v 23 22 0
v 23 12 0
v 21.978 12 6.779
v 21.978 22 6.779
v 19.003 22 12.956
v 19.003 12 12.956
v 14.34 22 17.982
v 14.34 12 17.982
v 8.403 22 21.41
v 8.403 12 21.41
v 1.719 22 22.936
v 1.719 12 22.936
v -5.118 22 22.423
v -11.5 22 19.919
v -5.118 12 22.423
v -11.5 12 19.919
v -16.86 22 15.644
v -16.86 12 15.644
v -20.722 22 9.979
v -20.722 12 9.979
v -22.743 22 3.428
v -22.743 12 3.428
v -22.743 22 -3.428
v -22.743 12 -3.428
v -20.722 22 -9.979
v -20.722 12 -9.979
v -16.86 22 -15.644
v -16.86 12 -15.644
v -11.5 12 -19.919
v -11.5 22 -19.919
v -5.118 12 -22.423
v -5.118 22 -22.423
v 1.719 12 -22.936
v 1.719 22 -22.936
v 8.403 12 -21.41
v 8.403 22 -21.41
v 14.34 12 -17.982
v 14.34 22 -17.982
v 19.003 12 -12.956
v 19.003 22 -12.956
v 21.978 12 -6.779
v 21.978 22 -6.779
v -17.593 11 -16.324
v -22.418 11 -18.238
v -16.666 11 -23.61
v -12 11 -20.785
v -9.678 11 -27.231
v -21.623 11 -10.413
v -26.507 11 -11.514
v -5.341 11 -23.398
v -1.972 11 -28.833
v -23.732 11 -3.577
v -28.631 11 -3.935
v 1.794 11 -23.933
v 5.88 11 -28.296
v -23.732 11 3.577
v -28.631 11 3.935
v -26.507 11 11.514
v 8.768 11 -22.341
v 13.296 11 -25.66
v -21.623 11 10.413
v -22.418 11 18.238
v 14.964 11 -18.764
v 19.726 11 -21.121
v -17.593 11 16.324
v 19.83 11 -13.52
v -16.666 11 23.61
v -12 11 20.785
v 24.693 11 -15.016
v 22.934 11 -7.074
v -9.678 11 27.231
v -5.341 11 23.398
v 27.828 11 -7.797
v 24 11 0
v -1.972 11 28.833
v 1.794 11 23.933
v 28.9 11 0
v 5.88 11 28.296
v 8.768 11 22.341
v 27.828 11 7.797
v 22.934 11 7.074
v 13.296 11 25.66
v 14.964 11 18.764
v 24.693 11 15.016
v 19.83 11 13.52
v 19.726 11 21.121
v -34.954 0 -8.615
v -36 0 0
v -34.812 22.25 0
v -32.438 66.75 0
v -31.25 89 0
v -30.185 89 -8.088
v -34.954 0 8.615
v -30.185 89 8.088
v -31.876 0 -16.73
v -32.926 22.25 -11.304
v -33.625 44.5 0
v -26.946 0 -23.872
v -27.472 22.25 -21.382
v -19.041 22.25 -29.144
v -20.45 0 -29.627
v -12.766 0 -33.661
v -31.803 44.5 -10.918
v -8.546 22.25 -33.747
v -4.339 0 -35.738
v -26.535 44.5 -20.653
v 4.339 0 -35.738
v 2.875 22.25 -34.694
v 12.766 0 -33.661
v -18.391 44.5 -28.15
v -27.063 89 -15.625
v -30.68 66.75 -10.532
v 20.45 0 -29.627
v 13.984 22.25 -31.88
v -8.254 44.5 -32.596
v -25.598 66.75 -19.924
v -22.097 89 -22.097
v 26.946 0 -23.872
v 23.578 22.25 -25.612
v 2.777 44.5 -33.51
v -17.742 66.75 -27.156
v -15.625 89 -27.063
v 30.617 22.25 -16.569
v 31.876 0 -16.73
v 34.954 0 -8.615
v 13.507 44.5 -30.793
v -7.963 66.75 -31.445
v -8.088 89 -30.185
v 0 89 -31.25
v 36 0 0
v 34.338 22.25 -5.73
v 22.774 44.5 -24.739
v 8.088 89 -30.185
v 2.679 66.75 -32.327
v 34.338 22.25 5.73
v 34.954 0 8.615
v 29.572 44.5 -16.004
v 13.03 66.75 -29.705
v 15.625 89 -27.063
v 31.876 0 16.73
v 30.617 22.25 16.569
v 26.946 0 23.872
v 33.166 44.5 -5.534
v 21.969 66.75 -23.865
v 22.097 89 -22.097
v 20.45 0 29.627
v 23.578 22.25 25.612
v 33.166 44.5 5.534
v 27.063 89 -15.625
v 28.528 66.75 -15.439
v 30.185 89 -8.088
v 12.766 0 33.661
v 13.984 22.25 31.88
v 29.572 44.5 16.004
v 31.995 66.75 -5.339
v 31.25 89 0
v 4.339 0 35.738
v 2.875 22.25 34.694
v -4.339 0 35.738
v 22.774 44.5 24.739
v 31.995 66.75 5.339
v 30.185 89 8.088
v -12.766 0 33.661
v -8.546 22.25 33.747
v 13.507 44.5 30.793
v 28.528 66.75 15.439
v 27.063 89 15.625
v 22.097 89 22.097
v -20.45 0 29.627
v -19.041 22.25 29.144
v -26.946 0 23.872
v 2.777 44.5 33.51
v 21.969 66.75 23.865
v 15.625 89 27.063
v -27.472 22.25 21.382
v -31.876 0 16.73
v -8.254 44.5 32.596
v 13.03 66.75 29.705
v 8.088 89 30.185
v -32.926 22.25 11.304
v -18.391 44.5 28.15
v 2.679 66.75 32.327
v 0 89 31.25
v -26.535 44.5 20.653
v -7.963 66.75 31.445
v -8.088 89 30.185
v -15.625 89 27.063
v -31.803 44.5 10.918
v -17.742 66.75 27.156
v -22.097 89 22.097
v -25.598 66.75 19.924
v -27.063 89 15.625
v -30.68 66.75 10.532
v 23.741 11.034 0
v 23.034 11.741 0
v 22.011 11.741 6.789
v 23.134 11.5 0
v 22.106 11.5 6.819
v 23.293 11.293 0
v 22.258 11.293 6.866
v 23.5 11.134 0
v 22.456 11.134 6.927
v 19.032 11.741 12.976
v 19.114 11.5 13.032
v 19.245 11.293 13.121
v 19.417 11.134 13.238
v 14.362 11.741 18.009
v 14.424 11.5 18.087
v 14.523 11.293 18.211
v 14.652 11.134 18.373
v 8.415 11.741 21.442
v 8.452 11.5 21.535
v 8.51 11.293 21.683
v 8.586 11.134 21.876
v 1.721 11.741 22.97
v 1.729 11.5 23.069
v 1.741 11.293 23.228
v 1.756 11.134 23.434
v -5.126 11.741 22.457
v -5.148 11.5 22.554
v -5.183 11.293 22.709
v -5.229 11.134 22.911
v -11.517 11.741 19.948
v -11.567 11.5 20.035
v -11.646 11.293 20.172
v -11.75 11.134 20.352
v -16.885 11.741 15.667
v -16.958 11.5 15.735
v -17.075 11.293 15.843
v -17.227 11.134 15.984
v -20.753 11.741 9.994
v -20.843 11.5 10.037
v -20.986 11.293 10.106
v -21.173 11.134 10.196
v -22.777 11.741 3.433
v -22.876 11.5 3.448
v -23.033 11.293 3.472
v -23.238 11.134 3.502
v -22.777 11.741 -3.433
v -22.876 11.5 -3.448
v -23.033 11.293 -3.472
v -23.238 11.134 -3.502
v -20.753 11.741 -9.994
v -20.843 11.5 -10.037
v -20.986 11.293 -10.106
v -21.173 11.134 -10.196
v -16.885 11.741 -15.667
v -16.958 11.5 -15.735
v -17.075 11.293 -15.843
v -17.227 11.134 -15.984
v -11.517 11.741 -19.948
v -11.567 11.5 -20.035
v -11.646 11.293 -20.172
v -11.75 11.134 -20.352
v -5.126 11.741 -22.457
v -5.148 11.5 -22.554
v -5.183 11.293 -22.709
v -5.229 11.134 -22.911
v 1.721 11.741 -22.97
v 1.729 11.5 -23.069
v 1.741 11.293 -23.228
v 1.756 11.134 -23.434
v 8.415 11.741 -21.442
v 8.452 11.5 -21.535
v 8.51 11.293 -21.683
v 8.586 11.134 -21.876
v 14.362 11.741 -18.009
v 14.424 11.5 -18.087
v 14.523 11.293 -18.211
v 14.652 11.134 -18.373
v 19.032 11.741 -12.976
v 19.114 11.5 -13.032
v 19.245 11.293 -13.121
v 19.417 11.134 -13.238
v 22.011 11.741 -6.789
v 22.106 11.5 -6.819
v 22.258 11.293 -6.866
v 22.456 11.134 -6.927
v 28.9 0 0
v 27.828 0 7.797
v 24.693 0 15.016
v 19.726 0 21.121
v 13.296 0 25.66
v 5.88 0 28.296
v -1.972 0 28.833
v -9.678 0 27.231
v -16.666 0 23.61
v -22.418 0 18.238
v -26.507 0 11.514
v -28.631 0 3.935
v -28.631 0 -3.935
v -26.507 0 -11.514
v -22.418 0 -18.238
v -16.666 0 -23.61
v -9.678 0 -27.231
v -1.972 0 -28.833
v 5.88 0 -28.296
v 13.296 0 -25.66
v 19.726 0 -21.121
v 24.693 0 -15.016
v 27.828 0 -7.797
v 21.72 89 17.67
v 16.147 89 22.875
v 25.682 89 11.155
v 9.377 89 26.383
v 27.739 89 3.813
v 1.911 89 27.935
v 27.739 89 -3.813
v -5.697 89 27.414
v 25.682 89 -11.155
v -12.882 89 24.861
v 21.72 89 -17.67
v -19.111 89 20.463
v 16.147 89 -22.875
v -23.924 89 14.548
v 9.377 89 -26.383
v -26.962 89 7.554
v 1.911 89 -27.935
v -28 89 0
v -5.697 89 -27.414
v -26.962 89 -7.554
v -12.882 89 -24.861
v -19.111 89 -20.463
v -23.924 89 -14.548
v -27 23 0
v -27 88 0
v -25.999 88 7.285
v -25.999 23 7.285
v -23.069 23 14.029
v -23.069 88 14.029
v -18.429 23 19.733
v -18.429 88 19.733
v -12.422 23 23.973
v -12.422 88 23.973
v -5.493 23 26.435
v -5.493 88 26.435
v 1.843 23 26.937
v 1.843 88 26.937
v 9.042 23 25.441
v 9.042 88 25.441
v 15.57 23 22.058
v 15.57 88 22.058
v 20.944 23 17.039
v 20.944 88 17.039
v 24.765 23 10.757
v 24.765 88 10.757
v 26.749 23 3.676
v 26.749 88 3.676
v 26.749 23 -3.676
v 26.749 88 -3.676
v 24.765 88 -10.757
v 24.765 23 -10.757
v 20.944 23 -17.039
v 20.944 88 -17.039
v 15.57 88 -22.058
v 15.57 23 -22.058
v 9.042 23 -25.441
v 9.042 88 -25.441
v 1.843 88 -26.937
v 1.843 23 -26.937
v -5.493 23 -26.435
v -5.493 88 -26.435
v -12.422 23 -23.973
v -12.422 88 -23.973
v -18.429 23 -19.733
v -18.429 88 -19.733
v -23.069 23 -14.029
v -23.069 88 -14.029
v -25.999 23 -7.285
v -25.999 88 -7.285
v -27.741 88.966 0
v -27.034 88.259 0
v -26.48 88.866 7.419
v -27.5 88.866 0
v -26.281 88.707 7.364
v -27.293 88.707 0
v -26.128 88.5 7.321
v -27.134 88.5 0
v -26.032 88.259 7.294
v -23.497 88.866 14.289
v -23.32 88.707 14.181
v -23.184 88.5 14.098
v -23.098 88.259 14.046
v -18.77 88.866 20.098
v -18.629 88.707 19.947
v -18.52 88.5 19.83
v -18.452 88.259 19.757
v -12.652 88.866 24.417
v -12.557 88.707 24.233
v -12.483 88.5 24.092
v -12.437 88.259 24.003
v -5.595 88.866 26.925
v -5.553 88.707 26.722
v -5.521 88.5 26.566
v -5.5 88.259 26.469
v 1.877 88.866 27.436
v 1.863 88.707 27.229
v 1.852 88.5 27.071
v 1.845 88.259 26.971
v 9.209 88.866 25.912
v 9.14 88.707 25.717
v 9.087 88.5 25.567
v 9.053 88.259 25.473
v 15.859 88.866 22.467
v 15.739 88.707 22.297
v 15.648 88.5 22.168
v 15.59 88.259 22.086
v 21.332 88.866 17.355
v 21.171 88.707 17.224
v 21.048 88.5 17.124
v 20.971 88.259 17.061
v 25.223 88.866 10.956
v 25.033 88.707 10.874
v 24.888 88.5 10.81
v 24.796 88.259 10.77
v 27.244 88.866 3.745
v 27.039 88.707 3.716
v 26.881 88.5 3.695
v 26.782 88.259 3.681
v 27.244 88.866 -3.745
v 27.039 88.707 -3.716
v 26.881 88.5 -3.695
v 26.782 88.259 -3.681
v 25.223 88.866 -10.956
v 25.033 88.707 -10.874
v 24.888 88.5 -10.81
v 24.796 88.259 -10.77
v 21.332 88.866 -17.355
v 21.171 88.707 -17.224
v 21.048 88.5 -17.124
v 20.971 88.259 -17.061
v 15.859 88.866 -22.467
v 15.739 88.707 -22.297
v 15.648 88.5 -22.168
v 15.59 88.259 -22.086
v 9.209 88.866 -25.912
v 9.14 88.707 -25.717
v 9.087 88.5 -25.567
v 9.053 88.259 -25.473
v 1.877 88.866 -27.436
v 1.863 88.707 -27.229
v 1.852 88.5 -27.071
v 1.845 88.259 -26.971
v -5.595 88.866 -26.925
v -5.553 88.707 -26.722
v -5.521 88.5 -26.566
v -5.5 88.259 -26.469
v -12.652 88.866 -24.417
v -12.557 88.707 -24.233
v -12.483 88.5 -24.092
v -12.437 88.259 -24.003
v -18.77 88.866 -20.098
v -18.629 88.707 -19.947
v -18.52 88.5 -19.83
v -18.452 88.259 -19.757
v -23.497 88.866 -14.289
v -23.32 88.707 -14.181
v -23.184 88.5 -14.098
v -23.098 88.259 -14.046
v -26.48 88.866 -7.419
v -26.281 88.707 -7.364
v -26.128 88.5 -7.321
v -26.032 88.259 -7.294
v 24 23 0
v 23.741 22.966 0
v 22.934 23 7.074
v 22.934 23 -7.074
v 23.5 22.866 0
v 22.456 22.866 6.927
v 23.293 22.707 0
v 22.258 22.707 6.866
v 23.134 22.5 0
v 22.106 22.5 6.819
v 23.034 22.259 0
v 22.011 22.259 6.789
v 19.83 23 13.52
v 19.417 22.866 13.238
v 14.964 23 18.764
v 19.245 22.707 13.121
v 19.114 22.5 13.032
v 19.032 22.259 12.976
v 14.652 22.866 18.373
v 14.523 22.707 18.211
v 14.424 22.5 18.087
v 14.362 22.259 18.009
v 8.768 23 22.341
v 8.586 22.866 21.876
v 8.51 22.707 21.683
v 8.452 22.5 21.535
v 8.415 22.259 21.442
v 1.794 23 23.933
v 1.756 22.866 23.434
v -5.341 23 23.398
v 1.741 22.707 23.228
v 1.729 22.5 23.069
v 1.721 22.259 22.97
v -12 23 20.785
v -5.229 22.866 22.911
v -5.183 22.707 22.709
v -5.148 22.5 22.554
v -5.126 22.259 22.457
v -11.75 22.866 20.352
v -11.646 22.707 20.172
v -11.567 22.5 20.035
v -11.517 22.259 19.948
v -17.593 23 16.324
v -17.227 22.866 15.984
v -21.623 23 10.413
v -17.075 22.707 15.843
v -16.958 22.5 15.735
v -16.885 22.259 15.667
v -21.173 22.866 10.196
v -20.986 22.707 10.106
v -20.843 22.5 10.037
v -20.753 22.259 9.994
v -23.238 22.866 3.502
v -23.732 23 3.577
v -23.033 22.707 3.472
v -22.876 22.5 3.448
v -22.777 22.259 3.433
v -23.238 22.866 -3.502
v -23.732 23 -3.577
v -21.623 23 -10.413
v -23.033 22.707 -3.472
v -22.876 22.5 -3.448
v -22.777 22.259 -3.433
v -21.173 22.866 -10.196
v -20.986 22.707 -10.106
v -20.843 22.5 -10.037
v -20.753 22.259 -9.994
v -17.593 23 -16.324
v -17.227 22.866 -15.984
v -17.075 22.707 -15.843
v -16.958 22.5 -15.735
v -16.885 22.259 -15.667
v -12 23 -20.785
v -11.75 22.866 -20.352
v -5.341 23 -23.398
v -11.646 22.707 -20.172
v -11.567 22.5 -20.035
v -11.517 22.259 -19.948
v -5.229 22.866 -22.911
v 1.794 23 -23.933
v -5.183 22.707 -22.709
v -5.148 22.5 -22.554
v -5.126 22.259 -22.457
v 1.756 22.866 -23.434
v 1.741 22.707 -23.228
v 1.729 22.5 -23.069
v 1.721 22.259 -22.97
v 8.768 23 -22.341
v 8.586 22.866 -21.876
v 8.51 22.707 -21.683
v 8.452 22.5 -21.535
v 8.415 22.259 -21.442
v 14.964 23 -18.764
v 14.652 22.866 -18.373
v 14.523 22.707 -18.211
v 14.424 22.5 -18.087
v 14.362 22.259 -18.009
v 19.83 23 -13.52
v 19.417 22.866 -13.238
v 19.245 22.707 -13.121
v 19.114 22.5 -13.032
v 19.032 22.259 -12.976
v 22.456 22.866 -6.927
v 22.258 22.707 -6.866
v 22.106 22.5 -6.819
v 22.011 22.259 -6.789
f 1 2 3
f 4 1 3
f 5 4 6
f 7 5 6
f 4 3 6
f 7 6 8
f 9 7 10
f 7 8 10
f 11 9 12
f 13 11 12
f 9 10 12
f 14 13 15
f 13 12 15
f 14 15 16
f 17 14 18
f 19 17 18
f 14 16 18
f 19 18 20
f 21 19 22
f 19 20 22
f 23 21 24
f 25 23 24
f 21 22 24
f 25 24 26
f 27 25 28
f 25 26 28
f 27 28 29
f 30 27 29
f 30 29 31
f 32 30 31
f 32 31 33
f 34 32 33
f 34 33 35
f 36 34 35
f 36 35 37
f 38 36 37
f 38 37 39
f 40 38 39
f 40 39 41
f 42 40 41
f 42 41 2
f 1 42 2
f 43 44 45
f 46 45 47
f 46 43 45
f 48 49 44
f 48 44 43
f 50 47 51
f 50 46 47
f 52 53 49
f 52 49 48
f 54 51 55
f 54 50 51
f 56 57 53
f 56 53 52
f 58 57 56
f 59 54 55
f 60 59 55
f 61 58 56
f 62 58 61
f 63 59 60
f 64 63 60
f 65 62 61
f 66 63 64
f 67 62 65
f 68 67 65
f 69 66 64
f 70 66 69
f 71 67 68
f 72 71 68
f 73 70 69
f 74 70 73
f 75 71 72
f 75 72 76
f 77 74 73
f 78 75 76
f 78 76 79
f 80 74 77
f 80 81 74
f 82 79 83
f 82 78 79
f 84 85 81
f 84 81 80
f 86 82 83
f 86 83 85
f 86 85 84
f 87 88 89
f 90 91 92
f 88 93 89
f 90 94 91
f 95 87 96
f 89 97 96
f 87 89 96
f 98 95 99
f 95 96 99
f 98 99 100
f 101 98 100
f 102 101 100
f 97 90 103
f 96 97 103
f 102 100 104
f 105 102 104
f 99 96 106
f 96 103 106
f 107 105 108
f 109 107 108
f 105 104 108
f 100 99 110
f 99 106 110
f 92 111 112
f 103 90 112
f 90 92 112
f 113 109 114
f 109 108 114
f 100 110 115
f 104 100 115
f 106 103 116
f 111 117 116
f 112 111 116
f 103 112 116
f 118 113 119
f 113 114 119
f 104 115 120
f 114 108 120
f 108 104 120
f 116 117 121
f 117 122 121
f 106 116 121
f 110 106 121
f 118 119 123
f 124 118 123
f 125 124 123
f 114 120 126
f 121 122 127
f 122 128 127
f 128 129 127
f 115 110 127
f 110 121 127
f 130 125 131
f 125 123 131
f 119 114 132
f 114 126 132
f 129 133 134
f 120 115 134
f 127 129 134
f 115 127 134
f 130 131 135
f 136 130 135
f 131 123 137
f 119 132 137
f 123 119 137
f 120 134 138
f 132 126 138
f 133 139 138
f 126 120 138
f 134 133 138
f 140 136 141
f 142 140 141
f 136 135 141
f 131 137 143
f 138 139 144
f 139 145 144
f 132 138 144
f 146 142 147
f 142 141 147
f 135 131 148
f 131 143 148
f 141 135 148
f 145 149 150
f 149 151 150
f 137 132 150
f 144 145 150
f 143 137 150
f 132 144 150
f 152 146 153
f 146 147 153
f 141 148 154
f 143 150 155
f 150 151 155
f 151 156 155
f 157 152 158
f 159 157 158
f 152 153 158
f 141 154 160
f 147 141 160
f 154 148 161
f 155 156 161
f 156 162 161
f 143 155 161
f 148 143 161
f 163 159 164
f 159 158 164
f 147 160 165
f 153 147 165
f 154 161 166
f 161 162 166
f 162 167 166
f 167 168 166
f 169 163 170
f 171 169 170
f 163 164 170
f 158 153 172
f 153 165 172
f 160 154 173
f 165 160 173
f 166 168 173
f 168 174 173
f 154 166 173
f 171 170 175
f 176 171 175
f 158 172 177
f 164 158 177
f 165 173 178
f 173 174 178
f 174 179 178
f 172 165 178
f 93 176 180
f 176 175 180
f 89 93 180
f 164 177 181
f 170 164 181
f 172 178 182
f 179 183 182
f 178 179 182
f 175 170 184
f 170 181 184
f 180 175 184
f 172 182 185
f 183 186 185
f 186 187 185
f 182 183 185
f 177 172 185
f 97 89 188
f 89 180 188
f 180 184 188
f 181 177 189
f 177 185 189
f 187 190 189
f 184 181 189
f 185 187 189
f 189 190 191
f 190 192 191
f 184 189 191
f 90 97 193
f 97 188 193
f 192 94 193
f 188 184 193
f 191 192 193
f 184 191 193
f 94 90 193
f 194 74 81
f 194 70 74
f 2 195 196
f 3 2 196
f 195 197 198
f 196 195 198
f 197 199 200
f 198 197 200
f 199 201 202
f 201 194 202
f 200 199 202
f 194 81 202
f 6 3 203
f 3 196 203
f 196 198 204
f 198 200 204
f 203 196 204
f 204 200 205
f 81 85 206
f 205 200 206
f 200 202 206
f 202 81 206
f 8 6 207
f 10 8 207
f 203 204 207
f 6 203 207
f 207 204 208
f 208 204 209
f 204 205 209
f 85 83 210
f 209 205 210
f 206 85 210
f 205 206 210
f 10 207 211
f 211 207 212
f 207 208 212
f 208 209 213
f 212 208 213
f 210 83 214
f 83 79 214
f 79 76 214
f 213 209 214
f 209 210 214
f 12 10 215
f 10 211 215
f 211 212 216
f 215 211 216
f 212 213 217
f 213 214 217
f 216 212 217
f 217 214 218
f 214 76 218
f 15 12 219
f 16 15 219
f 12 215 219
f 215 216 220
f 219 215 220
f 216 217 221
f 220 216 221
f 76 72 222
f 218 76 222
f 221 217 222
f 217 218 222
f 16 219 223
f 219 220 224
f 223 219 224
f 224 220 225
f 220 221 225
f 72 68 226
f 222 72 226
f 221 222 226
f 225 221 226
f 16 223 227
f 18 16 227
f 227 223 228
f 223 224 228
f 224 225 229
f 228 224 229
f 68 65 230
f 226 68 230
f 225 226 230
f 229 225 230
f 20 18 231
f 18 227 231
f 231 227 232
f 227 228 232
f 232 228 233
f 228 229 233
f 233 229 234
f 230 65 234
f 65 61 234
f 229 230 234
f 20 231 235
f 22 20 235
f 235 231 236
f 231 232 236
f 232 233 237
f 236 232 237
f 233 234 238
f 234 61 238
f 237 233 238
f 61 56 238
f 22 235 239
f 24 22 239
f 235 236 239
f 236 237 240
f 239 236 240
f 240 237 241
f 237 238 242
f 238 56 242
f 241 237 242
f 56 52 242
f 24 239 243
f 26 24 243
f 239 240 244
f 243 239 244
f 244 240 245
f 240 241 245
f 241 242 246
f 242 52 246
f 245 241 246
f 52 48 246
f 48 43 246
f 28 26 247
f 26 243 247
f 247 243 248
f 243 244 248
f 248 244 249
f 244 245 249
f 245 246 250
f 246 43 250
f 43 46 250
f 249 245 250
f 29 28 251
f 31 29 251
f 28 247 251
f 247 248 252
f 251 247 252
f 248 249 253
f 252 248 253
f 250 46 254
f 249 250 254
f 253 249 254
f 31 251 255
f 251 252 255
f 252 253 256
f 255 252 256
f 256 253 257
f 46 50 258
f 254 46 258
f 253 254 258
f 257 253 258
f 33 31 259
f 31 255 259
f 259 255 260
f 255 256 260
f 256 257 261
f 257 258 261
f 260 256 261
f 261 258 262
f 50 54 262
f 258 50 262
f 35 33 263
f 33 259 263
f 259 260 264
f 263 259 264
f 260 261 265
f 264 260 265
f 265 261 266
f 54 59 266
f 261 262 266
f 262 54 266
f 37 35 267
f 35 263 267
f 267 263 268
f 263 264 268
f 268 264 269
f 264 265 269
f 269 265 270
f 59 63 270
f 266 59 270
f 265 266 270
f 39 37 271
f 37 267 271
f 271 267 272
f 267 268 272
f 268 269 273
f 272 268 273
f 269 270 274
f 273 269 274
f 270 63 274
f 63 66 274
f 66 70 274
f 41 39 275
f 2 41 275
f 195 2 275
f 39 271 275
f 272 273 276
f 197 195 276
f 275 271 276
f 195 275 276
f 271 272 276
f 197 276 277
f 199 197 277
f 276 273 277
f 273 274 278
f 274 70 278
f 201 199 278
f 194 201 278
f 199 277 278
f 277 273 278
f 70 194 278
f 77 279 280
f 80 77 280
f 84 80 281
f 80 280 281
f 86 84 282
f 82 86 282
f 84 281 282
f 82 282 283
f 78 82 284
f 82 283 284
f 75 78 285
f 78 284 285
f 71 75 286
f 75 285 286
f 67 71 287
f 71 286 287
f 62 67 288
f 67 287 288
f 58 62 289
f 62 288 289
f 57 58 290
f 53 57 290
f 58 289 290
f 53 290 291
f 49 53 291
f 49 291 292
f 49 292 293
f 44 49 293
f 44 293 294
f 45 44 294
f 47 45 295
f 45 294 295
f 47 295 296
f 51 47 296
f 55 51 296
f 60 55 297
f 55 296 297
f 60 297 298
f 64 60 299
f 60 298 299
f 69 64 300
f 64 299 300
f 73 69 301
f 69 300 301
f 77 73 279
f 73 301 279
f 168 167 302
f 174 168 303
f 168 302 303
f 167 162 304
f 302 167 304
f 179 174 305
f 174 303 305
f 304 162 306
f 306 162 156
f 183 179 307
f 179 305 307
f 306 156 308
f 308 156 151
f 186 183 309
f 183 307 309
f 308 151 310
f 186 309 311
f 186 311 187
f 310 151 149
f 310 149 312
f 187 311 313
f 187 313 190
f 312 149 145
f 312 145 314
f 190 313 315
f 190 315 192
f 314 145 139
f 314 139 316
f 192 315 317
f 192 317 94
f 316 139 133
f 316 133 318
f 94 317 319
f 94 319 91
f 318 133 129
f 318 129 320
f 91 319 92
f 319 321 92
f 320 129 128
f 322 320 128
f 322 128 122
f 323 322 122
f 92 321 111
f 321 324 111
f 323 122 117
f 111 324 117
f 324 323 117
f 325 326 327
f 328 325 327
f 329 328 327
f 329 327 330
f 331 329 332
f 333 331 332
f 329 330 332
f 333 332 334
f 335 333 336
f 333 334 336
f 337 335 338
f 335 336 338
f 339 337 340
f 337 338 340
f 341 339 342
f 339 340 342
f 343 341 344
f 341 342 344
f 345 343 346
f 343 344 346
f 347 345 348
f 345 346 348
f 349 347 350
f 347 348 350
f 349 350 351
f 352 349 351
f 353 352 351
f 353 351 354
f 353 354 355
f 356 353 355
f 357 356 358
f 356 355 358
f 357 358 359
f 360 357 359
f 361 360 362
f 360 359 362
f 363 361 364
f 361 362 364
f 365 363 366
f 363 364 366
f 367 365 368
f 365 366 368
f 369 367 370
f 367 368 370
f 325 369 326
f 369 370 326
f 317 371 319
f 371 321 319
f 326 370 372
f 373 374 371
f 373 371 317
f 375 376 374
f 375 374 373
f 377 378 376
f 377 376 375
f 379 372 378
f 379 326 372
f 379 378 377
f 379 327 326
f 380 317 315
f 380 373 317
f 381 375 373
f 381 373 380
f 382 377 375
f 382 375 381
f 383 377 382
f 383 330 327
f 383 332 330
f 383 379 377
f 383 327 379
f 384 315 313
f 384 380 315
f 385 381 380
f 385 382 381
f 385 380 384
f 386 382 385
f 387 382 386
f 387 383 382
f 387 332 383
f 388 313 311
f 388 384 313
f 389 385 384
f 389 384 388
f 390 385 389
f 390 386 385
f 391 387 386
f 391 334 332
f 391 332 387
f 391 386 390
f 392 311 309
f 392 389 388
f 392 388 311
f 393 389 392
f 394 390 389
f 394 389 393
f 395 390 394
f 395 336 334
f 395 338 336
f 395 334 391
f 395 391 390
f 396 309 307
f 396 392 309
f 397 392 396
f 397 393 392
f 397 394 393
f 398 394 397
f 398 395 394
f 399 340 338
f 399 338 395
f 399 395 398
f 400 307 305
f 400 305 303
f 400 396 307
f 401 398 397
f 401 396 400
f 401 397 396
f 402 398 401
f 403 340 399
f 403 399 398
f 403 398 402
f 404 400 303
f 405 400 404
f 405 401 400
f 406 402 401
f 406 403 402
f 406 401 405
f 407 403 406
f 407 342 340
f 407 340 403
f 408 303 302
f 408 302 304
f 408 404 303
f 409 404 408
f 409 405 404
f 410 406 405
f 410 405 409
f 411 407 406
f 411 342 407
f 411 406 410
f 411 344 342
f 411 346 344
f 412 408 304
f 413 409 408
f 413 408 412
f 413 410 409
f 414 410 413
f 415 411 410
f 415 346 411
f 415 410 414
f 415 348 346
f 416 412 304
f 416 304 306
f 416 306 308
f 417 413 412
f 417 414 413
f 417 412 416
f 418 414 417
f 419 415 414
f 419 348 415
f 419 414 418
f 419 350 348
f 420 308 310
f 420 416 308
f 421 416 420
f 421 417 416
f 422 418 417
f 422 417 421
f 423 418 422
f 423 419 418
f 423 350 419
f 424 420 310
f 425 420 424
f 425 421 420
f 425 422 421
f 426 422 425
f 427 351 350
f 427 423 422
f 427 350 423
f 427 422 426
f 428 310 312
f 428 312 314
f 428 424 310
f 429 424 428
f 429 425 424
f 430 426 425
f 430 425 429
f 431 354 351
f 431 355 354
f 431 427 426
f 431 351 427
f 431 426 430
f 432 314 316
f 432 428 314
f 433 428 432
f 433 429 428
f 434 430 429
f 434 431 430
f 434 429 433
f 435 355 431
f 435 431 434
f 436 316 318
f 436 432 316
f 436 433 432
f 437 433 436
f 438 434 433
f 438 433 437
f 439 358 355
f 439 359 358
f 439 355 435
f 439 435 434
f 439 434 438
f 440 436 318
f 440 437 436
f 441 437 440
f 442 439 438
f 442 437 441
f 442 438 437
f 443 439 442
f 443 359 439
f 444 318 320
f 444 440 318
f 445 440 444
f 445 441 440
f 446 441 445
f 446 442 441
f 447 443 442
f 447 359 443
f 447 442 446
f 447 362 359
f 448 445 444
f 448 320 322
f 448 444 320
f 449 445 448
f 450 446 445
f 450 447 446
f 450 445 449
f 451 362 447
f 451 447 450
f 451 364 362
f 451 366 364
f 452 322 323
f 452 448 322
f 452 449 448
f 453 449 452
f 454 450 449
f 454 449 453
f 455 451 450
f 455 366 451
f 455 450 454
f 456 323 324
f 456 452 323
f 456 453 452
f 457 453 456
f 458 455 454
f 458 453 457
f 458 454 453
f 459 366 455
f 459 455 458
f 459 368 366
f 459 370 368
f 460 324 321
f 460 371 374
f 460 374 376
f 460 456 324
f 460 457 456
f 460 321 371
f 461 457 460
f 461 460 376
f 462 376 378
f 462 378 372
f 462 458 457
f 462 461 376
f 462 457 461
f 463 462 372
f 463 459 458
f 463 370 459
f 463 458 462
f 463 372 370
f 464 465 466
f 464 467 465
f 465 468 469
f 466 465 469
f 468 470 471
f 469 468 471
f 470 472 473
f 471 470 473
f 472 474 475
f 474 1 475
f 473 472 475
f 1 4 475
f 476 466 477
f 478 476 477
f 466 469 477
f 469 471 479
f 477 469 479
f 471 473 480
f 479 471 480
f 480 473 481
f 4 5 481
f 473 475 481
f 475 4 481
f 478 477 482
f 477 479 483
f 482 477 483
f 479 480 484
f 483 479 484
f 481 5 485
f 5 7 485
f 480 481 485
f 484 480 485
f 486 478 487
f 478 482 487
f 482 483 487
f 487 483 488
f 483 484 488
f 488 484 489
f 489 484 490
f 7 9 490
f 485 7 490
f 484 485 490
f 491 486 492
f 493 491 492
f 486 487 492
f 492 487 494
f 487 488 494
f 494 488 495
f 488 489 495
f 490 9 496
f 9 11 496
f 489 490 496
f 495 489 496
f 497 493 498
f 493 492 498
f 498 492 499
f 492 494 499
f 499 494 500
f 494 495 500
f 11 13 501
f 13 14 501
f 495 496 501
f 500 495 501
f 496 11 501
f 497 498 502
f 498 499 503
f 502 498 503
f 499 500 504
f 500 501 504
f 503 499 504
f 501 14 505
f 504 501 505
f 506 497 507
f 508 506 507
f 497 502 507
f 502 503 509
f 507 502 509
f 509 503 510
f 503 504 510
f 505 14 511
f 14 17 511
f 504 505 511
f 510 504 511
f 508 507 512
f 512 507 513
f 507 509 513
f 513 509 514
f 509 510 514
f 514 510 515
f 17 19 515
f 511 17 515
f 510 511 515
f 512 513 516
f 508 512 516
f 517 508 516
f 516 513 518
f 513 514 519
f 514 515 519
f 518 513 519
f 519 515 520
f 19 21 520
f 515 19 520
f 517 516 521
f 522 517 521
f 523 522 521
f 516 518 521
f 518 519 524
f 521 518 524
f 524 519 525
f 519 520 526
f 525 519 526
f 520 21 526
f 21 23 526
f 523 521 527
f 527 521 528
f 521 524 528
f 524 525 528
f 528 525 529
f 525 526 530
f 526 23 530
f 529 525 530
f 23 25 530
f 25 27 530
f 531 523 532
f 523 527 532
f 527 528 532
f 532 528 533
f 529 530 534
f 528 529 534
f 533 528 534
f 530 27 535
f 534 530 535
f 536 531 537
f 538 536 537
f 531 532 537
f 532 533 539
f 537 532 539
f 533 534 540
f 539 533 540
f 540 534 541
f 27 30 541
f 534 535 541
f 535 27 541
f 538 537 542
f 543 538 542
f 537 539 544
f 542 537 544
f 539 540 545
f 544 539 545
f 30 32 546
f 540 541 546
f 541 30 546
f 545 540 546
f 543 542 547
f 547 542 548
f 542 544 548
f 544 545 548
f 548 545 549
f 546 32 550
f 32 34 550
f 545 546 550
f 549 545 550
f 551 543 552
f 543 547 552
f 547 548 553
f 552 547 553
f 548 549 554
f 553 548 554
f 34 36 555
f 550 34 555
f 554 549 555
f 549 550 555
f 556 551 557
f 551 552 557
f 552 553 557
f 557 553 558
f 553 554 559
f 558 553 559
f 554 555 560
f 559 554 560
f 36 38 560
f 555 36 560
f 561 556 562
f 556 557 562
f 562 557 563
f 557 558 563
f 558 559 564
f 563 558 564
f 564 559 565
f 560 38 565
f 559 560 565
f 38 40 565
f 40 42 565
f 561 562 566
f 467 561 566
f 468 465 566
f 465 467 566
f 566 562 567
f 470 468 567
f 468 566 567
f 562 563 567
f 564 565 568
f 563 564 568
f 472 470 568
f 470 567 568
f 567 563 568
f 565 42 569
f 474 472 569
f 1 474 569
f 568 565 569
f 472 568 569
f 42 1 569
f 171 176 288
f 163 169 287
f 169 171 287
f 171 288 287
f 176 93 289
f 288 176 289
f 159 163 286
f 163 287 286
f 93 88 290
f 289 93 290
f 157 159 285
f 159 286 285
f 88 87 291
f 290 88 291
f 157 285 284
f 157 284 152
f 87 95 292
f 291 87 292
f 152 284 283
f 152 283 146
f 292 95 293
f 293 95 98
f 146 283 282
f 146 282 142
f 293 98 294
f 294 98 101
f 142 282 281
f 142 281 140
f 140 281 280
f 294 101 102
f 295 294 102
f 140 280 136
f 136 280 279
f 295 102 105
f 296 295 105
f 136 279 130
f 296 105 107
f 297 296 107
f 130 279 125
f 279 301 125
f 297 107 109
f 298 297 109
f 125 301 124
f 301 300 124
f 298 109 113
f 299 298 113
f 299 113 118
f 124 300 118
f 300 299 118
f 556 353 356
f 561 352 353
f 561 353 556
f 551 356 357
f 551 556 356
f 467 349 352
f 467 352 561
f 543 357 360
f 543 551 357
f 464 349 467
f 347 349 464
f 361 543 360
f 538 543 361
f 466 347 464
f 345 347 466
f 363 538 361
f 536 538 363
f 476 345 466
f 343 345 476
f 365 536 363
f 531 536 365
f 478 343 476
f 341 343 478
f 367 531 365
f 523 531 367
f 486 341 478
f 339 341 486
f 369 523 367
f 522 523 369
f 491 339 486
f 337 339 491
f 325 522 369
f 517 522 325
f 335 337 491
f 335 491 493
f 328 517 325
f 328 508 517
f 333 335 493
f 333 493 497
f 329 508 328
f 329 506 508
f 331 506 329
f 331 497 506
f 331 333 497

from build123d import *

# Parameters (mm, degrees)
SKETCH_2_R          = 27
CUT_EXTRUDE_1_DEPTH = 66
SKETCH_3_R          = 28.9
CUT_EXTRUDE_2_DEPTH = 11
SKETCH_4_R          = 23
CUT_EXTRUDE_3_DEPTH = 94.145048178
FILLET_1_R          = 1
FILLET_3_R          = 1


with BuildPart() as part:
    # 草圖1 → 旋轉1 (revolve)
    with BuildSketch(Plane.XY, mode=Mode.PRIVATE) as revolve_1_sk:
        Polygon((0, 0), (36, 0), (31.25, 89), (0, 89), align=None)
    revolve(revolve_1_sk.sketch.rotate(Axis((0, 89, 0), (0, -1, 0)), 180), axis=Axis((0, 89, 0), (0, -1, 0)))

    # 草圖2 → 除料-伸長1 (cut)
    with BuildSketch(Plane(origin=(0, 89, 0), x_dir=(1, 0, 0), z_dir=(0, 1, 0))):
        with Locations(Location((0, 0, 0), (0, 0, 180))):
            Circle(SKETCH_2_R)
    extrude(amount=-CUT_EXTRUDE_1_DEPTH, mode=Mode.SUBTRACT)

    # 草圖3 → 除料-伸長2 (cut)
    with BuildSketch(Plane.XZ):
        Circle(SKETCH_3_R)
    extrude(amount=-CUT_EXTRUDE_2_DEPTH, mode=Mode.SUBTRACT)

    # 草圖4 → 除料-伸長3 (cut, through all)
    with BuildSketch(Plane.XZ.offset(-11)):
        Circle(SKETCH_4_R)
    extrude(amount=-CUT_EXTRUDE_3_DEPTH, mode=Mode.SUBTRACT)

    # 圓角1
    fillet_1_edges = [part.edges().sort_by_distance(p)[0] for p in [
        (27, 89, 0),
    ]]
    fillet(fillet_1_edges, radius=FILLET_1_R)

    # 圓角3
    fillet_3_edges = [part.edges().sort_by_distance(p)[0] for p in [
        (-23, 23, 0),
        (-23, 11, 0),
    ]]
    fillet(fillet_3_edges, radius=FILLET_3_R)


solid = part.part
